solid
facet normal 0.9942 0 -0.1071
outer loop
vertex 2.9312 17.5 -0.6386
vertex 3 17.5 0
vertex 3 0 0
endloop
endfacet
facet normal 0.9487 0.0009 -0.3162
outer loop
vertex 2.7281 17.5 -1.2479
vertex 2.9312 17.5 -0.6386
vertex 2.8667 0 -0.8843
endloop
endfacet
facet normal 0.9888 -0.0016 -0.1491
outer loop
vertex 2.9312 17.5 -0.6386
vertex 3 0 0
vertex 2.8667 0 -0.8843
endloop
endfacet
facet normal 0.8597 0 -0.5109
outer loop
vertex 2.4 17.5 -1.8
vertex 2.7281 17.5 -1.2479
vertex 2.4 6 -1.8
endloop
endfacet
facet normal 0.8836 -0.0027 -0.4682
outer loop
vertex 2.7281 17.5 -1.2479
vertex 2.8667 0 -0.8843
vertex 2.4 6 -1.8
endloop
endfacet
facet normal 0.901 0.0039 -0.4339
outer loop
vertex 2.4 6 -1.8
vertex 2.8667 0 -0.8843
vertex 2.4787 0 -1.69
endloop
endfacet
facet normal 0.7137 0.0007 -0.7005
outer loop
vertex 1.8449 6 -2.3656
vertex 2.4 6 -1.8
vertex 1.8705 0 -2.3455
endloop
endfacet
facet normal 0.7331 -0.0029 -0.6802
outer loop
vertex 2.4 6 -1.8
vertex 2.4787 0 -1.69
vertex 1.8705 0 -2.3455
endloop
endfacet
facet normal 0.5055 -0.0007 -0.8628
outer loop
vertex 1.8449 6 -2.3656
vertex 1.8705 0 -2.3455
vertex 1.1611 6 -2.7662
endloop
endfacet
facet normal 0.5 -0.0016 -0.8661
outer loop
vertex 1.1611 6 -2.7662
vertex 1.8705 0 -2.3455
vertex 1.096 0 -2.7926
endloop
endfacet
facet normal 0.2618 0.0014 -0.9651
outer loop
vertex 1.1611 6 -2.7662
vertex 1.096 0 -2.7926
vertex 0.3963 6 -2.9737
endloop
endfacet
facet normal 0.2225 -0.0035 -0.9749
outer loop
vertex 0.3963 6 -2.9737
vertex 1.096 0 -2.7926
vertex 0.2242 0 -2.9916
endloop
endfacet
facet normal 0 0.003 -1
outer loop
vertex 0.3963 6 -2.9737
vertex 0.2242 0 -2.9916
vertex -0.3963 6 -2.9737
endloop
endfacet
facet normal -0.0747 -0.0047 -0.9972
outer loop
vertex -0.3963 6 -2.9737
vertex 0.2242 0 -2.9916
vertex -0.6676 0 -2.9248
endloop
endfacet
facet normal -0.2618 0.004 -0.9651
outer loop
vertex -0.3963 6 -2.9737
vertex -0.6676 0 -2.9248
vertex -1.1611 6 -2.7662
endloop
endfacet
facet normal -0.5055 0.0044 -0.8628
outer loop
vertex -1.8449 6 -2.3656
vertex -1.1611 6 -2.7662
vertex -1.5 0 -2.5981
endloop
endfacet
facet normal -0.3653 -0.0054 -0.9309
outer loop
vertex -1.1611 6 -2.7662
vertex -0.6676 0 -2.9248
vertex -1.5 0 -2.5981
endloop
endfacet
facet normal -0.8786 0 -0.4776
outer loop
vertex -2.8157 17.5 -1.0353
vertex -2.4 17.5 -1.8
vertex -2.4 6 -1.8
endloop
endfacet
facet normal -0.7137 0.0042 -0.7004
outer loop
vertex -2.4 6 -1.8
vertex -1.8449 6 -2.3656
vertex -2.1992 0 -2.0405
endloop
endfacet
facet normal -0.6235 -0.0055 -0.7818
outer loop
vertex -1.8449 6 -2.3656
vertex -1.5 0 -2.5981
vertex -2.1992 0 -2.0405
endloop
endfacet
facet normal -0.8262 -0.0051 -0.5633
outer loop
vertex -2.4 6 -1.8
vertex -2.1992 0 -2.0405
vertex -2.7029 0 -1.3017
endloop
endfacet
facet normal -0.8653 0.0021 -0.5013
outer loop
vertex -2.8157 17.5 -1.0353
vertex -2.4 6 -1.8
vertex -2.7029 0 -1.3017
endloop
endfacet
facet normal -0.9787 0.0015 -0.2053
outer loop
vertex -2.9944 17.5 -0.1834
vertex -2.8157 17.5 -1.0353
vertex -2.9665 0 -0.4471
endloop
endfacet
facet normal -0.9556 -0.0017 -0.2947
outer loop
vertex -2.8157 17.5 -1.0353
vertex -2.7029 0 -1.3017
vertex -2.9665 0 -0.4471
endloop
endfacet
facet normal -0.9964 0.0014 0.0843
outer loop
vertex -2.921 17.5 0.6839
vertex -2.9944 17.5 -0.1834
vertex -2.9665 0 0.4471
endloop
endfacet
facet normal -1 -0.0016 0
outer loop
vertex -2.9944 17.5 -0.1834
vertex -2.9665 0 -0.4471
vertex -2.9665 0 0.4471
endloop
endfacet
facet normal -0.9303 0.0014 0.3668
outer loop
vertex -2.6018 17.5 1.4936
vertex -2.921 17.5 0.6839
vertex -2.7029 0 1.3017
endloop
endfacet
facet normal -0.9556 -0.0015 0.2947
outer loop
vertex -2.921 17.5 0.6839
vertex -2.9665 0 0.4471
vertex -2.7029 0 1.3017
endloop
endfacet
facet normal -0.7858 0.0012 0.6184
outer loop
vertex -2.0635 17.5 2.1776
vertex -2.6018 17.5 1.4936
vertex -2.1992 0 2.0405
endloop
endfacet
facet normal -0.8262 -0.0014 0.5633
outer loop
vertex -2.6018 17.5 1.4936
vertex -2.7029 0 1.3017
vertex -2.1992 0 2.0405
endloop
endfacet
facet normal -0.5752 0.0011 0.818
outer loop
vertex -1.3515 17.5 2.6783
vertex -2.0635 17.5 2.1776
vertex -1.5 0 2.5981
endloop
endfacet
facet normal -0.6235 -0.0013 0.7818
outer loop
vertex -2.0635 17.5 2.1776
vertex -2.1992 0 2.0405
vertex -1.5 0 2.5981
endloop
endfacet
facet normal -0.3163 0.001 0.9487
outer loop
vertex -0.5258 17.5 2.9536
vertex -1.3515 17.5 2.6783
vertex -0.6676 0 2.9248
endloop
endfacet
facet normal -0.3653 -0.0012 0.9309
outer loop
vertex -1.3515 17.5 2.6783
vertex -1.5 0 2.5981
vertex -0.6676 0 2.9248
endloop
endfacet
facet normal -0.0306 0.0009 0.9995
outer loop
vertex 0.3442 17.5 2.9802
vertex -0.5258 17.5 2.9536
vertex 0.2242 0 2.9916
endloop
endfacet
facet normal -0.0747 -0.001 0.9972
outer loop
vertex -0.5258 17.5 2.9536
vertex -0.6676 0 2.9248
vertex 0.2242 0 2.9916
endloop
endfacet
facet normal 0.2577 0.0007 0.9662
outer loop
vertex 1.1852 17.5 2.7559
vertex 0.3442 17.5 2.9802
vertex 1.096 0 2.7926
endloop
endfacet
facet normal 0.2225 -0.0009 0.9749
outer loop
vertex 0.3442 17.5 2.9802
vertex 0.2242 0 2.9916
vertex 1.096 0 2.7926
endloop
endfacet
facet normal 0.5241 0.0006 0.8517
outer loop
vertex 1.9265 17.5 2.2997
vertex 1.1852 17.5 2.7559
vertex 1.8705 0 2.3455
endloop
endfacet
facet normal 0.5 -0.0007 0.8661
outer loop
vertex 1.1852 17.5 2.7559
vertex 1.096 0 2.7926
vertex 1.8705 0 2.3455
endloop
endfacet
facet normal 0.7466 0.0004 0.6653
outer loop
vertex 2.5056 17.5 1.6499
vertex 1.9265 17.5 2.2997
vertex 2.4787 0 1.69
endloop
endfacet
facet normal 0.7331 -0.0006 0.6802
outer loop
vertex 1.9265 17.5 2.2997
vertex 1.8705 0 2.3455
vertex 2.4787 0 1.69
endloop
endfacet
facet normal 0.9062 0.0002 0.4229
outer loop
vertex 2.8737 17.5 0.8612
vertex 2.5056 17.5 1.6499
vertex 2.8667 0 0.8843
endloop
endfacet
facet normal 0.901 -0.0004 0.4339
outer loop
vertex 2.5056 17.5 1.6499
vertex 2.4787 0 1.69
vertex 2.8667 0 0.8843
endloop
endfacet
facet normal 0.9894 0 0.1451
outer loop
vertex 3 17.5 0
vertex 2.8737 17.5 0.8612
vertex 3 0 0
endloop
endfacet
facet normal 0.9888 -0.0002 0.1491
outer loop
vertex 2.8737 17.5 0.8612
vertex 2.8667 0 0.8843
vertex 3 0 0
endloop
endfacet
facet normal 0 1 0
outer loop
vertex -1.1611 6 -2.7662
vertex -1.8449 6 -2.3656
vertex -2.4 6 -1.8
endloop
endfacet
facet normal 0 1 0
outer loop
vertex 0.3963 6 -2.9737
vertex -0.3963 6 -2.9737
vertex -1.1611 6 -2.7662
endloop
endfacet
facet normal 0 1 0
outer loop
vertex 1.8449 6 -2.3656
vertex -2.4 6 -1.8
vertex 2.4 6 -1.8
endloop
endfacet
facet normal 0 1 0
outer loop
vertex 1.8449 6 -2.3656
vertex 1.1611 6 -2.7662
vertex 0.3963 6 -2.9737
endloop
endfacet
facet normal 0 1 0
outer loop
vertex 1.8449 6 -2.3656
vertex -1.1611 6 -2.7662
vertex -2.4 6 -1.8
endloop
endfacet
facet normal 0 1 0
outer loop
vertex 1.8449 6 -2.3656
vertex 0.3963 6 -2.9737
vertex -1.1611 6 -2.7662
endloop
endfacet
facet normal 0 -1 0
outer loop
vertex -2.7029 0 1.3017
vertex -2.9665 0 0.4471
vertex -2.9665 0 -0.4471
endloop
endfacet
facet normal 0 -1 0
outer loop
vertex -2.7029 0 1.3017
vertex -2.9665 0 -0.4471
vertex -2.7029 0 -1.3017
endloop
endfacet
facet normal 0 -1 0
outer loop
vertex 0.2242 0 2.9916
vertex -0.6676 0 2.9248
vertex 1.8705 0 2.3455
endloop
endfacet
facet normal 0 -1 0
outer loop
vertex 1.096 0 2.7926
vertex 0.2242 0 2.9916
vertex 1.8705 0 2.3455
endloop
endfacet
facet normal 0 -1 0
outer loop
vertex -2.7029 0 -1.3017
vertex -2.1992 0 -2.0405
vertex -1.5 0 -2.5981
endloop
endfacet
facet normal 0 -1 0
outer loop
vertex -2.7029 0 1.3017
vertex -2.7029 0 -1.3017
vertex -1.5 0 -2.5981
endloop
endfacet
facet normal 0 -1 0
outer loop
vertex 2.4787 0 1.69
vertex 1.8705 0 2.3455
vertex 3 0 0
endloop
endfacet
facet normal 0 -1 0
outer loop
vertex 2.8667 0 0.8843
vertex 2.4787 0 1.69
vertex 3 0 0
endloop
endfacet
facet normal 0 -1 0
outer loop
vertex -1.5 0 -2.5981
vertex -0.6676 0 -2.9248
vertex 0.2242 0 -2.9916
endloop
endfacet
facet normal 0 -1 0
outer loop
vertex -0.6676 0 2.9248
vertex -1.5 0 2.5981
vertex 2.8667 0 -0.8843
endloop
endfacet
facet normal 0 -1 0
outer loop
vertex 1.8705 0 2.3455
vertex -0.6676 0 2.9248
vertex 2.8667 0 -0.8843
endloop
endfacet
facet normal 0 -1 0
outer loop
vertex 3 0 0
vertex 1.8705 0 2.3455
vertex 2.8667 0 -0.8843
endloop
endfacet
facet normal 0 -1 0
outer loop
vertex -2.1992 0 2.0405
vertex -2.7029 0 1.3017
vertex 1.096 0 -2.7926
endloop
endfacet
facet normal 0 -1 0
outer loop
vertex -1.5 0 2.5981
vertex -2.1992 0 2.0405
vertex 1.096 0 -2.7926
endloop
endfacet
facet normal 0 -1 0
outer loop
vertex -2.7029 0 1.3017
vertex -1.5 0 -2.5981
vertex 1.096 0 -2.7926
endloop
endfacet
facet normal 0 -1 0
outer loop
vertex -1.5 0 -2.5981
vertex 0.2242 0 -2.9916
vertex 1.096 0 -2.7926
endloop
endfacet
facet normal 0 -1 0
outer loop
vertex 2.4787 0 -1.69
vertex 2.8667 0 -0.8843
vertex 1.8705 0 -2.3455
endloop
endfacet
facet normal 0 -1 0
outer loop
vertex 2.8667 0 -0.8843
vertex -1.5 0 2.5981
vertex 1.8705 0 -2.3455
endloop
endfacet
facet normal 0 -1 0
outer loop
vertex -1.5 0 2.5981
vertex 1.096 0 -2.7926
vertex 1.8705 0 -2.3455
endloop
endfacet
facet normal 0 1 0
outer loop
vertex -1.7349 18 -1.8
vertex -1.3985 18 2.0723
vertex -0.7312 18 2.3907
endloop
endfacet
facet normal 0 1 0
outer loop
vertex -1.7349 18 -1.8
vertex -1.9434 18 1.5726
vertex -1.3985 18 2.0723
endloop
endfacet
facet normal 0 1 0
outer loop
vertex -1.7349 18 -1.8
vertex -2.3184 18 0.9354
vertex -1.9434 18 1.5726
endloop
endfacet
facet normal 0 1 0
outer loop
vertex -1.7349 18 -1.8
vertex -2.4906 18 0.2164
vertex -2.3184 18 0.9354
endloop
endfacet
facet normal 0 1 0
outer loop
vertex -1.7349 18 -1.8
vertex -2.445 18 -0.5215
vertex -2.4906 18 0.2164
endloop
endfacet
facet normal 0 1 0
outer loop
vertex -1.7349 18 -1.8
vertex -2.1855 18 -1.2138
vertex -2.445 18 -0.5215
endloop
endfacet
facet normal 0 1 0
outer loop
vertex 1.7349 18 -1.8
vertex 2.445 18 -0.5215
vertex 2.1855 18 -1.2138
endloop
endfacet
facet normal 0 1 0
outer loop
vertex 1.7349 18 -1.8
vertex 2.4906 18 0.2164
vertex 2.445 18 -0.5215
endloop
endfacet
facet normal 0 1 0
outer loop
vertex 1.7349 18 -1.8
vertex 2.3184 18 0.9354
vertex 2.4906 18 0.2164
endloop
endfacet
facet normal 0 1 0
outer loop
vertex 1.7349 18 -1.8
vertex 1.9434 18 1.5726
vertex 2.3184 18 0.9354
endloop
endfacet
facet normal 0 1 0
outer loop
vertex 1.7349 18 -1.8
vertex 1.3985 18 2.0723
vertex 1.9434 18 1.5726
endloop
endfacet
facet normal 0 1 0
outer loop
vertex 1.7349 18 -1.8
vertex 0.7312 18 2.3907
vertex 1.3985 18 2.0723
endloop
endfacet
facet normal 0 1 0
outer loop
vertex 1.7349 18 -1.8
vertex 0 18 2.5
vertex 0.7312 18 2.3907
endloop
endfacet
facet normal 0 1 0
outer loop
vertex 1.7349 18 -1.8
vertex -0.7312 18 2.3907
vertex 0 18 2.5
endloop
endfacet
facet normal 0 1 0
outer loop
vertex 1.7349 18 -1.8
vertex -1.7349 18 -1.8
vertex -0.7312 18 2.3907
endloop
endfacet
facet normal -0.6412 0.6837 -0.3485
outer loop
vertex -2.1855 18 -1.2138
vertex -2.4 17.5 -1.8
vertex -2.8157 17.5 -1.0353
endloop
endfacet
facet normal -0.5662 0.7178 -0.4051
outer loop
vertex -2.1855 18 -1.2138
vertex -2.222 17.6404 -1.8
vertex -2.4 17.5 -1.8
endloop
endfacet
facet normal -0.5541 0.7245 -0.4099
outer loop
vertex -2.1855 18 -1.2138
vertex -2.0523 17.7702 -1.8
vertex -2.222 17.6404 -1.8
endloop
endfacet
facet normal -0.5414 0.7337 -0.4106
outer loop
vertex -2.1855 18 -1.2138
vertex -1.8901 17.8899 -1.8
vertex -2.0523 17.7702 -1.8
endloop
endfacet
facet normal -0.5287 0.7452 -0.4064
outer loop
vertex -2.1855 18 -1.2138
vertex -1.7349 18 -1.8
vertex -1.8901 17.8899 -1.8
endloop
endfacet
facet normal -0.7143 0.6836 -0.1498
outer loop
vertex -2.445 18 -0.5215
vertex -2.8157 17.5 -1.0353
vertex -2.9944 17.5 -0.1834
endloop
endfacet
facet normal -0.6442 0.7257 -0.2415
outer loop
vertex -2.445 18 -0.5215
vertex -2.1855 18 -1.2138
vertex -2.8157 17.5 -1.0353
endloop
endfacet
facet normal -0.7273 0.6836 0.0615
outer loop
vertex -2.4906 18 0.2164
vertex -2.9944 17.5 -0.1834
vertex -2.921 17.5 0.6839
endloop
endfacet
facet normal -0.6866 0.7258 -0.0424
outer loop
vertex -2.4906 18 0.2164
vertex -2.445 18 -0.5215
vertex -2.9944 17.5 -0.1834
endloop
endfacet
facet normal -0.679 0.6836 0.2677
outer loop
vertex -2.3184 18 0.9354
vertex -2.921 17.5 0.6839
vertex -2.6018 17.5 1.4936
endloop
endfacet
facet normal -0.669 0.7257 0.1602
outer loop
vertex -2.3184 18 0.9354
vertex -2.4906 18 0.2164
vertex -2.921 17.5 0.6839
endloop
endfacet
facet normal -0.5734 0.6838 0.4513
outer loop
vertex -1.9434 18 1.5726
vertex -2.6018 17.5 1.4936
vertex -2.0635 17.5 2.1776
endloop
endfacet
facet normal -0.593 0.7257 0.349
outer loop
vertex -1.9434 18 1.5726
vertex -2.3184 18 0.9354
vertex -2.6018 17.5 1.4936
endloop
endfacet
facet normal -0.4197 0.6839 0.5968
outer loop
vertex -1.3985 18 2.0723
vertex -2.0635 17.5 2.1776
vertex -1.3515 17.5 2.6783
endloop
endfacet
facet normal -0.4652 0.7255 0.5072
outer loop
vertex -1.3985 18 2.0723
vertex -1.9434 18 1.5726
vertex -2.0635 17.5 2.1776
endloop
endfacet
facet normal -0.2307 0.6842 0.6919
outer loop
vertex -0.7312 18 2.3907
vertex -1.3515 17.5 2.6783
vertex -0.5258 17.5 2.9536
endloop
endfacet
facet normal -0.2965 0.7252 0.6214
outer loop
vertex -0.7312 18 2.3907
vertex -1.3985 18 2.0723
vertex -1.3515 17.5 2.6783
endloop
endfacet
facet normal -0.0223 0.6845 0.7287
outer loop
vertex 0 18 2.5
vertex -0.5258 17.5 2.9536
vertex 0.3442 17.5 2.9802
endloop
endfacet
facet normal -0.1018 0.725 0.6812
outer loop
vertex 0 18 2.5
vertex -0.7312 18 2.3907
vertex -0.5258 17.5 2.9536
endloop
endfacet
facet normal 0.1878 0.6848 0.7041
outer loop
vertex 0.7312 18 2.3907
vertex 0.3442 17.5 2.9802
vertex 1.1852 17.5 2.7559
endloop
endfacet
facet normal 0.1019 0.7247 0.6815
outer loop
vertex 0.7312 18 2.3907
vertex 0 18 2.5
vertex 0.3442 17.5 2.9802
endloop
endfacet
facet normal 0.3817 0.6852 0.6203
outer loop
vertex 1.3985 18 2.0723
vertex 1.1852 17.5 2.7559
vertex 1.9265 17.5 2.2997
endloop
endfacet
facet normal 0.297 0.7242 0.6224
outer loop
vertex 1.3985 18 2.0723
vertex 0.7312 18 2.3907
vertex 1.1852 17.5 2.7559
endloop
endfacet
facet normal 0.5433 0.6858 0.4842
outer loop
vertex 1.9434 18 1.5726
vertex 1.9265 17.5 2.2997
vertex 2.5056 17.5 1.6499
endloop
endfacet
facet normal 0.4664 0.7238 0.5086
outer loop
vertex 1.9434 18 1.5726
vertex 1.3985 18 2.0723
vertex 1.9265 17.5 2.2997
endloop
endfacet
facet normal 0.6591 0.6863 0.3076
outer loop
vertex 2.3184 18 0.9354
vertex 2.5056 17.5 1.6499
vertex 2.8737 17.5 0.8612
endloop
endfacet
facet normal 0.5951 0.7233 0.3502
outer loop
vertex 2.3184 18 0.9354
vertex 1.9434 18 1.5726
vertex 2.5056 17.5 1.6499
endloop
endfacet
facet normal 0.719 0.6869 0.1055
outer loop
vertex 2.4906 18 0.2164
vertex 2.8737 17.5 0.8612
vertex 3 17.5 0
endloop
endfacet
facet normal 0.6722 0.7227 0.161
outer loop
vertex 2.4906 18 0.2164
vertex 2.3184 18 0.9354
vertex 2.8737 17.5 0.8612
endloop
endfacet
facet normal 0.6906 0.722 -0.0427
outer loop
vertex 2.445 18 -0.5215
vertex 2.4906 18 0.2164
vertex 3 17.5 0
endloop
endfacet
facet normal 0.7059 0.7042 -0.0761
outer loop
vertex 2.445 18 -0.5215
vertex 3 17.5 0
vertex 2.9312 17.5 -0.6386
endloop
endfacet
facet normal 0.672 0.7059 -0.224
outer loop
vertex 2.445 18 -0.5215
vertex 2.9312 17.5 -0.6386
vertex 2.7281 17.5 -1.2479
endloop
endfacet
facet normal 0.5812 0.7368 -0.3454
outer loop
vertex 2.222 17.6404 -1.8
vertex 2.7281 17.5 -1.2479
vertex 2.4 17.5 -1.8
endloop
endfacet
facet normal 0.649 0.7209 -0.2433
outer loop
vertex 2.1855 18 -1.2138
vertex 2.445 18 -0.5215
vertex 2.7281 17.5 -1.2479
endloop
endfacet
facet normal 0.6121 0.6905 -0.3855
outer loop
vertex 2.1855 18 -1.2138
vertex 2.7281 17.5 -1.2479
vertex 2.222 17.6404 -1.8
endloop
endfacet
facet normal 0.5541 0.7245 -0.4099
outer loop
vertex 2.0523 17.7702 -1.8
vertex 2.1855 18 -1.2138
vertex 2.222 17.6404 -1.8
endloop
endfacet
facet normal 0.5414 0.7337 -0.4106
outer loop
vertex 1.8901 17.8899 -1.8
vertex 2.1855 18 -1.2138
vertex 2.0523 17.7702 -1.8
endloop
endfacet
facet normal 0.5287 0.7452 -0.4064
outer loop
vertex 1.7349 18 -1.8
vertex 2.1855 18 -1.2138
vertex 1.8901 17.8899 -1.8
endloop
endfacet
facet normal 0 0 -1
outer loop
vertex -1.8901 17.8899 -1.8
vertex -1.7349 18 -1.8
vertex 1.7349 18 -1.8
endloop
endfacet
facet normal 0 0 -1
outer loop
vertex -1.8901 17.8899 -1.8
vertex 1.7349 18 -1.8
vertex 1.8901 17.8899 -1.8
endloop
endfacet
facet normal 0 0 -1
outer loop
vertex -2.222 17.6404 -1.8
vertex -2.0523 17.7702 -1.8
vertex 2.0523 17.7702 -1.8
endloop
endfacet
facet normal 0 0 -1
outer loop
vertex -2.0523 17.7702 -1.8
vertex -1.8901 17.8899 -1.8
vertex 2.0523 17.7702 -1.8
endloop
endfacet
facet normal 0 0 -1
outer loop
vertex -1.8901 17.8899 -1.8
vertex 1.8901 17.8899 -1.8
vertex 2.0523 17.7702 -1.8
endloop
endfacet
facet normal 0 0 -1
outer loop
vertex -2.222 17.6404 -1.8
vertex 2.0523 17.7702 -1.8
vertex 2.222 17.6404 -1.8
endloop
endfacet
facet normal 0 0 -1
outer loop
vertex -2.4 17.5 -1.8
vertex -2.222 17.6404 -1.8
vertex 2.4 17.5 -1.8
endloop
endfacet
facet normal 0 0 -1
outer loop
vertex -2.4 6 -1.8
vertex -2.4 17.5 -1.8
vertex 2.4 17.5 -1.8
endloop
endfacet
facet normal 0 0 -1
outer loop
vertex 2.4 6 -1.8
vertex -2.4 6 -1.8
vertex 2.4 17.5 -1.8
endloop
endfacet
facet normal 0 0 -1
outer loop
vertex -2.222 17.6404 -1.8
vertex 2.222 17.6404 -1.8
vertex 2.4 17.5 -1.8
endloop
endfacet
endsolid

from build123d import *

# Parameters (mm, degrees)
SKETCH_1_R          = 3
EXTRUDE_1_DEPTH     = 18
CHAMFER_1_SIZE      = 0.5
CUT_EXTRUDE_1_DEPTH = 12


with BuildPart() as part:
    # Эскиз1 → Бобышка-Вытянуть1 (new body)
    with BuildSketch(Plane(origin=(0, 0, 0), x_dir=(1, 0, 0), z_dir=(0, 1, 0))):
        Circle(SKETCH_1_R)
    extrude(amount=EXTRUDE_1_DEPTH)

    # Фаска1
    chamfer_1_edges = [part.edges().sort_by_distance(p)[0] for p in [
        (-3, 18, 0),
    ]]
    chamfer(chamfer_1_edges, length=CHAMFER_1_SIZE)

    # Эскиз2 → Вырез-Вытянуть1 (cut)
    with BuildSketch(Plane(origin=(0, 18, 0), x_dir=(1, 0, 0), z_dir=(0, 1, 0))):
        with BuildLine():
            Line((-2.4, 1.8), (2.4, 1.8))
            ThreePointArc((2.4, 1.8), (0, 3), (-2.4, 1.8))
        make_face()
    extrude(amount=-CUT_EXTRUDE_1_DEPTH, mode=Mode.SUBTRACT)


solid = part.part
